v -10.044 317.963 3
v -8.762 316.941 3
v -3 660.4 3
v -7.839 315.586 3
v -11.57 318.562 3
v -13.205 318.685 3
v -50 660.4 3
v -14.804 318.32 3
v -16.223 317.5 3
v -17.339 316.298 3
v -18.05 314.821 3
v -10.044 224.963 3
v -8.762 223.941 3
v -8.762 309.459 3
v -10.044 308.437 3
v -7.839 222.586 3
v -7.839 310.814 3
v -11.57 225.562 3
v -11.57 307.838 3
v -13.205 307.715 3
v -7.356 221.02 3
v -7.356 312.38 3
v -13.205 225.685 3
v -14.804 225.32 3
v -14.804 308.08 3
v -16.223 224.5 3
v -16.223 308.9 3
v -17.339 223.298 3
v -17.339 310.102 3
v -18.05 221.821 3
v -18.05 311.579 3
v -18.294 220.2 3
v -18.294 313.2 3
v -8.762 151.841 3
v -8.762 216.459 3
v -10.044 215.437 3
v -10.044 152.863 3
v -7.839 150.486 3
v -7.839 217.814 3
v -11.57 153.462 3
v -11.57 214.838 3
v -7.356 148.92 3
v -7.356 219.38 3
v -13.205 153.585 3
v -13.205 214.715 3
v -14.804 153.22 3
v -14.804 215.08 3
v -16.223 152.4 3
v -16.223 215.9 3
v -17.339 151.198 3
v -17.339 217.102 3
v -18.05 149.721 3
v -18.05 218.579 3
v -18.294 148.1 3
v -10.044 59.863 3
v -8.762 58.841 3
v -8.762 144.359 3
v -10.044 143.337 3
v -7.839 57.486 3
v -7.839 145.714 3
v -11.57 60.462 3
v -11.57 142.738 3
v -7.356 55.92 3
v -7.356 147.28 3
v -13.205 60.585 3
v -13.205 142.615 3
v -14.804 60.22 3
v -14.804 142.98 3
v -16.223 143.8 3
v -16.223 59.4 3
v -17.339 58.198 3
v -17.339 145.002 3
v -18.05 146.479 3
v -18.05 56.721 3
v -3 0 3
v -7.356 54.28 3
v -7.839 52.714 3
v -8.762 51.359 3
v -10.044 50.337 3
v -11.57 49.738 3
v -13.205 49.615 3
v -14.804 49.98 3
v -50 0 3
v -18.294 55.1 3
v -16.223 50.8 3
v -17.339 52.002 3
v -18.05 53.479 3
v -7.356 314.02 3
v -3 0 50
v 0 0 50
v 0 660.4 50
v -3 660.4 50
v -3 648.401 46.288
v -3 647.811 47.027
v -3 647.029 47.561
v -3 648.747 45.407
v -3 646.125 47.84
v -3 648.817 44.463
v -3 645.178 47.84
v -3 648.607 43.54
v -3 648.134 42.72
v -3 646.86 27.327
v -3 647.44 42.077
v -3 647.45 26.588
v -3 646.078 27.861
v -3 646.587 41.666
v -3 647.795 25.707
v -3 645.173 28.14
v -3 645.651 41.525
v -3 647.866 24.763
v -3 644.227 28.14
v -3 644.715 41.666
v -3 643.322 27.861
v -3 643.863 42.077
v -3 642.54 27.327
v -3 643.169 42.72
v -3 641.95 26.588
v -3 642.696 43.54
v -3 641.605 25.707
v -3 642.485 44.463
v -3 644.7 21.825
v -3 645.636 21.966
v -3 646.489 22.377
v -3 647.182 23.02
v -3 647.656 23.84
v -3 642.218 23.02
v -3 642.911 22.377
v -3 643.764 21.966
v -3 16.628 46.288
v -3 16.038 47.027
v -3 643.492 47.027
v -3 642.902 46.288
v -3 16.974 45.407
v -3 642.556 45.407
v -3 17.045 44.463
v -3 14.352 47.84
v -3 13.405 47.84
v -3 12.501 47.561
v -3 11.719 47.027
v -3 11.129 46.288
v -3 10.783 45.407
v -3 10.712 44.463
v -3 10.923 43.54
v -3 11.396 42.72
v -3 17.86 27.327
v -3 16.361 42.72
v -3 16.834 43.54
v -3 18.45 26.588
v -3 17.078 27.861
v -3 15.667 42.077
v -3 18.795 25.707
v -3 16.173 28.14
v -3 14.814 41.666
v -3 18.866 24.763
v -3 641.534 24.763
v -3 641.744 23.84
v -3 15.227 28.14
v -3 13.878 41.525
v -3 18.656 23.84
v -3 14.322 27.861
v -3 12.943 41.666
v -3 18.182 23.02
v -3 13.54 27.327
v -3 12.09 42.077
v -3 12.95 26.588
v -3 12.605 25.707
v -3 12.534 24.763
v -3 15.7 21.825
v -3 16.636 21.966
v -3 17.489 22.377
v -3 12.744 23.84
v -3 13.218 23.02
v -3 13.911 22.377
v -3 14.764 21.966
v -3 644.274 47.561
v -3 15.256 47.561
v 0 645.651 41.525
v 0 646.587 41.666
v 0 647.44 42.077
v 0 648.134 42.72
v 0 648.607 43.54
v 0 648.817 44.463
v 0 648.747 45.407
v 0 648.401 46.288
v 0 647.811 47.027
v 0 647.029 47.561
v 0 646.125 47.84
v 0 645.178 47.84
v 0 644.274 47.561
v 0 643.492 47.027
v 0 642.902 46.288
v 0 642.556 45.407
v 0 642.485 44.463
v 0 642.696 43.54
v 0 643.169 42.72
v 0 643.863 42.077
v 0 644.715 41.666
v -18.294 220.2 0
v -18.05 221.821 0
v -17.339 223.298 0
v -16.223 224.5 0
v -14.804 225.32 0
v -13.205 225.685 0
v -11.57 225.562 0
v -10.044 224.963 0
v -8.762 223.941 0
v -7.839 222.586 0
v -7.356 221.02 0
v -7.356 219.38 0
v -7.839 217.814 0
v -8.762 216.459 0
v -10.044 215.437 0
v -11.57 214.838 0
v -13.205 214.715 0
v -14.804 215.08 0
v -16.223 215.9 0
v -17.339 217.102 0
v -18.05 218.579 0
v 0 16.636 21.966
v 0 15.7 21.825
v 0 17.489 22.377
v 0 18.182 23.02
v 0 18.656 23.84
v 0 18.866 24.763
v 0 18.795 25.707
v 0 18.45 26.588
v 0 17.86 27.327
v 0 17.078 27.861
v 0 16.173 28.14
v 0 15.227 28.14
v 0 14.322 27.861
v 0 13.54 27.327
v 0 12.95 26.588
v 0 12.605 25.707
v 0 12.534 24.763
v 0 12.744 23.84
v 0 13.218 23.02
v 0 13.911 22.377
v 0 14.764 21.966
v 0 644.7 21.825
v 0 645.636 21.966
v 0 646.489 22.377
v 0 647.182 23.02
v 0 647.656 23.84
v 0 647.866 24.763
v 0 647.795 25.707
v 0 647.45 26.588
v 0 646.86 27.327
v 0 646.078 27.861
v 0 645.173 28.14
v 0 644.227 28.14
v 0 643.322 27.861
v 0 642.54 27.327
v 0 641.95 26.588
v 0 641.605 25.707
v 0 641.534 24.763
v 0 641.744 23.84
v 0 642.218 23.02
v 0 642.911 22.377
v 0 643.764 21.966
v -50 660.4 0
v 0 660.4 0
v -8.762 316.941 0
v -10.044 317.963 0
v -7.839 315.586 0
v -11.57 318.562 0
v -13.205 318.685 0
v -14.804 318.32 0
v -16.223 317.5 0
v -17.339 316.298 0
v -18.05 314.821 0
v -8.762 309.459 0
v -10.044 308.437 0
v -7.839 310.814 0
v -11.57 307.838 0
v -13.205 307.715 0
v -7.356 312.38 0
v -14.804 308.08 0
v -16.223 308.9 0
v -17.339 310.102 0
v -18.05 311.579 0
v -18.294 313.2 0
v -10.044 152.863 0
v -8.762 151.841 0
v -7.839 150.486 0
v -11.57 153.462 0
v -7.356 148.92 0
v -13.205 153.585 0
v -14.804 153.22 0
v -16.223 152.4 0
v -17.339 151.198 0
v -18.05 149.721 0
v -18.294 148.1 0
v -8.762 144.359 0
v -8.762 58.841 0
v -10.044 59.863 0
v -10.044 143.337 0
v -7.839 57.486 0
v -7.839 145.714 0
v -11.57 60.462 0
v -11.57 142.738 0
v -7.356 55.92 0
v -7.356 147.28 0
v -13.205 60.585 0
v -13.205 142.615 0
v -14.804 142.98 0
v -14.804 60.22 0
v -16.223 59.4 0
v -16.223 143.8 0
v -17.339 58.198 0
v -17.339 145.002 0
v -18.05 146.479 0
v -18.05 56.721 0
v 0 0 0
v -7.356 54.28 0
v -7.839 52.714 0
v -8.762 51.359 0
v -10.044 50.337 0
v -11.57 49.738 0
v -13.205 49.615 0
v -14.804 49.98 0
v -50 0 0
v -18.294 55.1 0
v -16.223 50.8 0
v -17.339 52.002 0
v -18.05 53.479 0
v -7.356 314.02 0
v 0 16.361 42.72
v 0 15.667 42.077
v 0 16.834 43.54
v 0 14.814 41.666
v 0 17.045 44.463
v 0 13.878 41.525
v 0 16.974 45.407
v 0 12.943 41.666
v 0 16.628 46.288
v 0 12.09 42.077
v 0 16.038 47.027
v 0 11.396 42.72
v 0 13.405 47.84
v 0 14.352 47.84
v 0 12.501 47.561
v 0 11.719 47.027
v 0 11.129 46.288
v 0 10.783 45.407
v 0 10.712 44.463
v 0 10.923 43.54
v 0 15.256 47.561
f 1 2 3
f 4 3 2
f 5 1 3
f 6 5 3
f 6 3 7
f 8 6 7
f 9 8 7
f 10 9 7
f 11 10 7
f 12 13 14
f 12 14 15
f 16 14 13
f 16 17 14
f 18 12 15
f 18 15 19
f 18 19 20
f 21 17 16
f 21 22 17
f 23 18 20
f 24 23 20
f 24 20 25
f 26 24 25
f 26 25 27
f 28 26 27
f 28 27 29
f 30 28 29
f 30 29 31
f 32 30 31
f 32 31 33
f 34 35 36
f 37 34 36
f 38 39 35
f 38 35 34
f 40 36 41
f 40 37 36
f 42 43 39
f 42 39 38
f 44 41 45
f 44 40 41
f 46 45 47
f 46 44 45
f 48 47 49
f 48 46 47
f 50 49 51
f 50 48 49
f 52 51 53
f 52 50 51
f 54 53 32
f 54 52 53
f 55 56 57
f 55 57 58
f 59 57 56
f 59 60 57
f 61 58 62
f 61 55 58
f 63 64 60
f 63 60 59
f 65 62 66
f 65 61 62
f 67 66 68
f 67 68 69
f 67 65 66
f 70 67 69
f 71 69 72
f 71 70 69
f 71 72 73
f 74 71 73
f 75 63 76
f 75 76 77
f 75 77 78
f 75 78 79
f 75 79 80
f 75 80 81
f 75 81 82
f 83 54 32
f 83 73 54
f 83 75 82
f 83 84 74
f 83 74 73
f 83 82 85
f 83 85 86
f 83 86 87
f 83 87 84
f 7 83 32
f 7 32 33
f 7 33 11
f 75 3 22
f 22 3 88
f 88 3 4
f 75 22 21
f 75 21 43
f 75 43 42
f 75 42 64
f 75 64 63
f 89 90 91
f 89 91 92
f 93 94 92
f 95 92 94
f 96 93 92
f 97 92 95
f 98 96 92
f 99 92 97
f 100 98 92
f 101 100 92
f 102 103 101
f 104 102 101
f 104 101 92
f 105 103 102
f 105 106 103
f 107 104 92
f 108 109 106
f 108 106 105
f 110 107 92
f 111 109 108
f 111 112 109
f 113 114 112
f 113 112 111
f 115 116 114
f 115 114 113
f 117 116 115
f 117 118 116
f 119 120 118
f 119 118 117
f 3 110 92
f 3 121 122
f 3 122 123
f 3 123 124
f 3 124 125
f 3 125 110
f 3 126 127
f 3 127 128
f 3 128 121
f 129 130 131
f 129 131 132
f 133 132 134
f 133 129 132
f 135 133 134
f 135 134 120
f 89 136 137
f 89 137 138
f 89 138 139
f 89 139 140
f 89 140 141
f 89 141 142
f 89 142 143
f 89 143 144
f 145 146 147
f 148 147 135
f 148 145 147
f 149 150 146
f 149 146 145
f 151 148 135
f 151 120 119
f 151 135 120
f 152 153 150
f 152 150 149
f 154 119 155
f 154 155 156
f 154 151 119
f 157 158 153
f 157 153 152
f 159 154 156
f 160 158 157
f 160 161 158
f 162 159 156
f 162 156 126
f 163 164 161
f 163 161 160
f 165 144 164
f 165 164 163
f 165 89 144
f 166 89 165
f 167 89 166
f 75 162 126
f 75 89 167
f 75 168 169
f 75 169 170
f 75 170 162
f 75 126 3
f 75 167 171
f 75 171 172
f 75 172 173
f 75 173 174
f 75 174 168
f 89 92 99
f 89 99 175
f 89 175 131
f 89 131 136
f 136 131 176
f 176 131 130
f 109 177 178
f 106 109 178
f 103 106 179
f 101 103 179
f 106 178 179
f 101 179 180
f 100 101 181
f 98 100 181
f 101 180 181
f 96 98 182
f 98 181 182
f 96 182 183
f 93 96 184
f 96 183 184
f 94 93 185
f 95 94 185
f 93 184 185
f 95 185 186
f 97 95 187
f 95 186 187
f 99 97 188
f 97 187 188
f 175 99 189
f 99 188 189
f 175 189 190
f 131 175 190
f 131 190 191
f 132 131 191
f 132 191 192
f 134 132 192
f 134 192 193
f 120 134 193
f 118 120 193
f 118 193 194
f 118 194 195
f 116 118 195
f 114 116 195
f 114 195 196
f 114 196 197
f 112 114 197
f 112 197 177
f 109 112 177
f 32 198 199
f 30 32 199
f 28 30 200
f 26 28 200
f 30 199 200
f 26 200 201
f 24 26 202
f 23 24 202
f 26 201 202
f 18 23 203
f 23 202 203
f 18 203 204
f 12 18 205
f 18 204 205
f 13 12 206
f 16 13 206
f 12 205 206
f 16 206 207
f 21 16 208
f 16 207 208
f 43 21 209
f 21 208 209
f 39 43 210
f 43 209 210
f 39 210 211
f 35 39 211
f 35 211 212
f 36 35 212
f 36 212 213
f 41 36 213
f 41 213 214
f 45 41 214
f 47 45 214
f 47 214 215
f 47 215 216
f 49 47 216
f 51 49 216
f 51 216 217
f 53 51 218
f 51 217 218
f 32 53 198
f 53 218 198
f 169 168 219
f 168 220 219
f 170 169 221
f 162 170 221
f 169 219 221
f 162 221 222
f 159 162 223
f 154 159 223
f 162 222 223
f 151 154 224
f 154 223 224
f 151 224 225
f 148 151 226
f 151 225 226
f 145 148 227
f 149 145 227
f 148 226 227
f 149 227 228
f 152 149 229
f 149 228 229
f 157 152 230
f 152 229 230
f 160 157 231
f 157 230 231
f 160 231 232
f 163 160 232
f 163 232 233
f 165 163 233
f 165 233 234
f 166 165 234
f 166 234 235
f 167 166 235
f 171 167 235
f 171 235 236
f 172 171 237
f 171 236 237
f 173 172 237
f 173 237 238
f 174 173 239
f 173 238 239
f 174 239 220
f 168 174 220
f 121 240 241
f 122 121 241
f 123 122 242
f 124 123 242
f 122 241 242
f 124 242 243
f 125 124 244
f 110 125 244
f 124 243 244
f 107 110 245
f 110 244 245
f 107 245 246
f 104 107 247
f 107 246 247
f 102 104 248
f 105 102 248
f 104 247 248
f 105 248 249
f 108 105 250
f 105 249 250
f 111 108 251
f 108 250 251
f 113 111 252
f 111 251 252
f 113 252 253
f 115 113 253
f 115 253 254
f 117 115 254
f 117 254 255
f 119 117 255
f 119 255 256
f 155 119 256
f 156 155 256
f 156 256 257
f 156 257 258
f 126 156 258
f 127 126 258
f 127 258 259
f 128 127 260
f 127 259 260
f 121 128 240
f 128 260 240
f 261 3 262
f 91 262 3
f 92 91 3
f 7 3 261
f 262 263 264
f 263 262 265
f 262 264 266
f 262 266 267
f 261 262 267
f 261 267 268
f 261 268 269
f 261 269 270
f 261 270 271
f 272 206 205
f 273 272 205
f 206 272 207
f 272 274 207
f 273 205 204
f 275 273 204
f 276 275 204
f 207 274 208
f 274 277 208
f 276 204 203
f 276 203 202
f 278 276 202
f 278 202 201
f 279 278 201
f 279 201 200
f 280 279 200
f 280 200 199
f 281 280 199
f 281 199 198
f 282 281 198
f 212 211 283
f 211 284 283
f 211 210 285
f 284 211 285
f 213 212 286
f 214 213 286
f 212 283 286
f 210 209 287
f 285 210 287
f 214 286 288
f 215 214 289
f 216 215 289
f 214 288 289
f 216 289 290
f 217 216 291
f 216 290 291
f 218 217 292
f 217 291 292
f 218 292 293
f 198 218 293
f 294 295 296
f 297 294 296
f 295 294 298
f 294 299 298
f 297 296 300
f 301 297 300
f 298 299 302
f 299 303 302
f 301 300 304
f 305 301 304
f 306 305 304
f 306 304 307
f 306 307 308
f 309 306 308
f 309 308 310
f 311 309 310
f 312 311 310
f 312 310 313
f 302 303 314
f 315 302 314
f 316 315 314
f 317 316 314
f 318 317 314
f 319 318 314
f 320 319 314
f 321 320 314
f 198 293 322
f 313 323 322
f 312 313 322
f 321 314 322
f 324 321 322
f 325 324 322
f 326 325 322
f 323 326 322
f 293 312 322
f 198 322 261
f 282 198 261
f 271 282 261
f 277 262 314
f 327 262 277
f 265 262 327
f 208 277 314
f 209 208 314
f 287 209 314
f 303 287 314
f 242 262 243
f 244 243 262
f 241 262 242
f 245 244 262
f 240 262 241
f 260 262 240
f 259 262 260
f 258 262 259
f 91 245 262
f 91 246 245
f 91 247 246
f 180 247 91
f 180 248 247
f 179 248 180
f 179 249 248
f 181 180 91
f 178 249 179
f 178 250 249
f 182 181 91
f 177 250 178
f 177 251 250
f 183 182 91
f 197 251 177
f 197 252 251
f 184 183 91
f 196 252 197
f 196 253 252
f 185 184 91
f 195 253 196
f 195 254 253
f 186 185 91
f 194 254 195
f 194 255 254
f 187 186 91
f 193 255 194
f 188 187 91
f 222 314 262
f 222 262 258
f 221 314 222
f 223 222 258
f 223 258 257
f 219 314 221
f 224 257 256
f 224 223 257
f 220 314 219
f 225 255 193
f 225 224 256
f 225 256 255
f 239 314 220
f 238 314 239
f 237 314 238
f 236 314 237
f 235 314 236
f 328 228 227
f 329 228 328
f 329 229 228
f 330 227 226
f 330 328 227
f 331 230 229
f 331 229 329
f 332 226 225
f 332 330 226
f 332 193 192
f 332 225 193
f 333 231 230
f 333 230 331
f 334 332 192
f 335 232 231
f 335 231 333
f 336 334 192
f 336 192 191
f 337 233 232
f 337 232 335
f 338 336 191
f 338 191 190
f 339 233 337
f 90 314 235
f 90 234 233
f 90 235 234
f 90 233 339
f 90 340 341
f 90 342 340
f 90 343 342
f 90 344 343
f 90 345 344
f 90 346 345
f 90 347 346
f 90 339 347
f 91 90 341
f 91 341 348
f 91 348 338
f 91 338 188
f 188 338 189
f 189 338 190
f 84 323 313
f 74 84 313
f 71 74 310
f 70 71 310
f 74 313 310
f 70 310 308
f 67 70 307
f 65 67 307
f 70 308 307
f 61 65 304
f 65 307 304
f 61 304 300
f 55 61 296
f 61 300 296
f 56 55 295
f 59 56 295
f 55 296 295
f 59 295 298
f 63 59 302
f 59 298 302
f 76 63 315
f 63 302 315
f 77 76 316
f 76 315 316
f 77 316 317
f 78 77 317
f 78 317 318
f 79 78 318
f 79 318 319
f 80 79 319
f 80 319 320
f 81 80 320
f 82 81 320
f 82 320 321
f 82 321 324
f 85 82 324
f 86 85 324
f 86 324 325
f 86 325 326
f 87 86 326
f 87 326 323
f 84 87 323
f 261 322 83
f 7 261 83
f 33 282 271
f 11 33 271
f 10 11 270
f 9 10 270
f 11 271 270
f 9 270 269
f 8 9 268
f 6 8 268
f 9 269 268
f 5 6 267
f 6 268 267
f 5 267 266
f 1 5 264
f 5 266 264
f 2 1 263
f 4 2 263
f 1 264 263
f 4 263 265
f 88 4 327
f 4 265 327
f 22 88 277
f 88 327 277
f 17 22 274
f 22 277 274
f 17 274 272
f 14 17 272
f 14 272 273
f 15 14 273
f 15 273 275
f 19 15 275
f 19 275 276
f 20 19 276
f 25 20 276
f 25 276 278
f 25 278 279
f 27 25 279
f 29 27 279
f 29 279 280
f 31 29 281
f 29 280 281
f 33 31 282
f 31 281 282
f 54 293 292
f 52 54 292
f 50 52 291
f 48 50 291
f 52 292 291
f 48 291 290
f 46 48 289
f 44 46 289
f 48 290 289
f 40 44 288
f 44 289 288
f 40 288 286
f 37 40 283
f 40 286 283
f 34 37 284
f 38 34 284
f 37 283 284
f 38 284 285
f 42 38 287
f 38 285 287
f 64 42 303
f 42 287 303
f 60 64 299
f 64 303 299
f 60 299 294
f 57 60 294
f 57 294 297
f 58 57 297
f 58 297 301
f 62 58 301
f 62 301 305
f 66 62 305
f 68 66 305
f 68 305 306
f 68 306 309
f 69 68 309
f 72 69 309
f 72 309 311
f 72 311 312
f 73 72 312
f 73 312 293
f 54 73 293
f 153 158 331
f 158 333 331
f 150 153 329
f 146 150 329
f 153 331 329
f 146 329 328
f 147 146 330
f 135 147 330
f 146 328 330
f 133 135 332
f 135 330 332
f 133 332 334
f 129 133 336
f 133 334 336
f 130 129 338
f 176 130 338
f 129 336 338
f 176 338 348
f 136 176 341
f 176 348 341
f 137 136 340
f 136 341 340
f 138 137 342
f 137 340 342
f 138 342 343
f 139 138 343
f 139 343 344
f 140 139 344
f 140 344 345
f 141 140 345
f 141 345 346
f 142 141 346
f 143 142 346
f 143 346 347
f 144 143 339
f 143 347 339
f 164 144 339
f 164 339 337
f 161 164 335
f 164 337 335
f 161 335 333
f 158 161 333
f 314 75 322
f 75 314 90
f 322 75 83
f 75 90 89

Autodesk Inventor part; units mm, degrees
ref_plane "YZ Plane" through (0, 0, 0) normal (1, 0, 0) x (0, 1, 0)
ref_plane "XZ Plane" through (0, 0, 0) normal (0, 1, 0) x (-1, 0, 0)
ref_plane "XY Plane" through (0, 0, 0) normal (0, 0, 1) x (1, 0, 0)
sketch "Sketch1" plane through (0, 0, 0) normal (0, 1, 0) x (-1, 0, 0)
  line L0 (0, 0) -> (50, 0)
  line L1 (50, 0) -> (50, 3)
  line L2 (0, 0) -> (0, 50)
  line L3 (0, 50) -> (3, 50)
  line L4 (3, 50) -> (3, 3)
  line L5 (3, 3) -> (50, 3)
  dimension "d0" = 50
  dimension "d1" = 3
  dimension "d2" = 50
  dimension "d3" = 3
extrude "Extrusion1" add sketch "Sketch1" along normal blind 660.4
sketch "Sketch3" plane through (0, 0, 50) normal (1, 0, 0) x (0, 0, -1)
  circle A0 centre (25, 15.7) radius 3.175
  circle A1 centre (25, 644.7) radius 3.175
  dimension "d57" = 6.35
  dimension "d59" = 6.35
extrude "Extrusion3" cut sketch "Sketch3" against normal blind 25.4
sketch "Sketch4" plane through (0, 0, 50) normal (1, 0, 0) x (0, 0, -1)
  circle A0 centre (5.3, 645.6513) radius 3.175
extrude "Extrusion4" cut sketch "Sketch4" against normal blind 25.4
sketch "Sketch5" plane through (0, 0, 50) normal (1, 0, 0) x (0, 0, -1)
  circle A0 centre (5.3, 13.8784) radius 3.175
extrude "Extrusion5" cut sketch "Sketch5" against normal blind 25.4
sketch "Sketch6" plane through (0, 0, 0) normal (0, 0, -1) x (-1, 0, 0)
  circle A0 centre (12.7942, 55.1) radius 5.5
  circle A1 centre (12.7942, 148.1) radius 5.5
  circle A2 centre (12.7942, 220.2) radius 5.5
  circle A3 centre (12.7942, 313.2) radius 5.5
extrude "Extrusion6" cut sketch "Sketch6" against normal blind 25.4
equation "\"d59\" = d57"
properties part number "26in Angle Channel CIM Mount Right" material "Aluminum 6061"
